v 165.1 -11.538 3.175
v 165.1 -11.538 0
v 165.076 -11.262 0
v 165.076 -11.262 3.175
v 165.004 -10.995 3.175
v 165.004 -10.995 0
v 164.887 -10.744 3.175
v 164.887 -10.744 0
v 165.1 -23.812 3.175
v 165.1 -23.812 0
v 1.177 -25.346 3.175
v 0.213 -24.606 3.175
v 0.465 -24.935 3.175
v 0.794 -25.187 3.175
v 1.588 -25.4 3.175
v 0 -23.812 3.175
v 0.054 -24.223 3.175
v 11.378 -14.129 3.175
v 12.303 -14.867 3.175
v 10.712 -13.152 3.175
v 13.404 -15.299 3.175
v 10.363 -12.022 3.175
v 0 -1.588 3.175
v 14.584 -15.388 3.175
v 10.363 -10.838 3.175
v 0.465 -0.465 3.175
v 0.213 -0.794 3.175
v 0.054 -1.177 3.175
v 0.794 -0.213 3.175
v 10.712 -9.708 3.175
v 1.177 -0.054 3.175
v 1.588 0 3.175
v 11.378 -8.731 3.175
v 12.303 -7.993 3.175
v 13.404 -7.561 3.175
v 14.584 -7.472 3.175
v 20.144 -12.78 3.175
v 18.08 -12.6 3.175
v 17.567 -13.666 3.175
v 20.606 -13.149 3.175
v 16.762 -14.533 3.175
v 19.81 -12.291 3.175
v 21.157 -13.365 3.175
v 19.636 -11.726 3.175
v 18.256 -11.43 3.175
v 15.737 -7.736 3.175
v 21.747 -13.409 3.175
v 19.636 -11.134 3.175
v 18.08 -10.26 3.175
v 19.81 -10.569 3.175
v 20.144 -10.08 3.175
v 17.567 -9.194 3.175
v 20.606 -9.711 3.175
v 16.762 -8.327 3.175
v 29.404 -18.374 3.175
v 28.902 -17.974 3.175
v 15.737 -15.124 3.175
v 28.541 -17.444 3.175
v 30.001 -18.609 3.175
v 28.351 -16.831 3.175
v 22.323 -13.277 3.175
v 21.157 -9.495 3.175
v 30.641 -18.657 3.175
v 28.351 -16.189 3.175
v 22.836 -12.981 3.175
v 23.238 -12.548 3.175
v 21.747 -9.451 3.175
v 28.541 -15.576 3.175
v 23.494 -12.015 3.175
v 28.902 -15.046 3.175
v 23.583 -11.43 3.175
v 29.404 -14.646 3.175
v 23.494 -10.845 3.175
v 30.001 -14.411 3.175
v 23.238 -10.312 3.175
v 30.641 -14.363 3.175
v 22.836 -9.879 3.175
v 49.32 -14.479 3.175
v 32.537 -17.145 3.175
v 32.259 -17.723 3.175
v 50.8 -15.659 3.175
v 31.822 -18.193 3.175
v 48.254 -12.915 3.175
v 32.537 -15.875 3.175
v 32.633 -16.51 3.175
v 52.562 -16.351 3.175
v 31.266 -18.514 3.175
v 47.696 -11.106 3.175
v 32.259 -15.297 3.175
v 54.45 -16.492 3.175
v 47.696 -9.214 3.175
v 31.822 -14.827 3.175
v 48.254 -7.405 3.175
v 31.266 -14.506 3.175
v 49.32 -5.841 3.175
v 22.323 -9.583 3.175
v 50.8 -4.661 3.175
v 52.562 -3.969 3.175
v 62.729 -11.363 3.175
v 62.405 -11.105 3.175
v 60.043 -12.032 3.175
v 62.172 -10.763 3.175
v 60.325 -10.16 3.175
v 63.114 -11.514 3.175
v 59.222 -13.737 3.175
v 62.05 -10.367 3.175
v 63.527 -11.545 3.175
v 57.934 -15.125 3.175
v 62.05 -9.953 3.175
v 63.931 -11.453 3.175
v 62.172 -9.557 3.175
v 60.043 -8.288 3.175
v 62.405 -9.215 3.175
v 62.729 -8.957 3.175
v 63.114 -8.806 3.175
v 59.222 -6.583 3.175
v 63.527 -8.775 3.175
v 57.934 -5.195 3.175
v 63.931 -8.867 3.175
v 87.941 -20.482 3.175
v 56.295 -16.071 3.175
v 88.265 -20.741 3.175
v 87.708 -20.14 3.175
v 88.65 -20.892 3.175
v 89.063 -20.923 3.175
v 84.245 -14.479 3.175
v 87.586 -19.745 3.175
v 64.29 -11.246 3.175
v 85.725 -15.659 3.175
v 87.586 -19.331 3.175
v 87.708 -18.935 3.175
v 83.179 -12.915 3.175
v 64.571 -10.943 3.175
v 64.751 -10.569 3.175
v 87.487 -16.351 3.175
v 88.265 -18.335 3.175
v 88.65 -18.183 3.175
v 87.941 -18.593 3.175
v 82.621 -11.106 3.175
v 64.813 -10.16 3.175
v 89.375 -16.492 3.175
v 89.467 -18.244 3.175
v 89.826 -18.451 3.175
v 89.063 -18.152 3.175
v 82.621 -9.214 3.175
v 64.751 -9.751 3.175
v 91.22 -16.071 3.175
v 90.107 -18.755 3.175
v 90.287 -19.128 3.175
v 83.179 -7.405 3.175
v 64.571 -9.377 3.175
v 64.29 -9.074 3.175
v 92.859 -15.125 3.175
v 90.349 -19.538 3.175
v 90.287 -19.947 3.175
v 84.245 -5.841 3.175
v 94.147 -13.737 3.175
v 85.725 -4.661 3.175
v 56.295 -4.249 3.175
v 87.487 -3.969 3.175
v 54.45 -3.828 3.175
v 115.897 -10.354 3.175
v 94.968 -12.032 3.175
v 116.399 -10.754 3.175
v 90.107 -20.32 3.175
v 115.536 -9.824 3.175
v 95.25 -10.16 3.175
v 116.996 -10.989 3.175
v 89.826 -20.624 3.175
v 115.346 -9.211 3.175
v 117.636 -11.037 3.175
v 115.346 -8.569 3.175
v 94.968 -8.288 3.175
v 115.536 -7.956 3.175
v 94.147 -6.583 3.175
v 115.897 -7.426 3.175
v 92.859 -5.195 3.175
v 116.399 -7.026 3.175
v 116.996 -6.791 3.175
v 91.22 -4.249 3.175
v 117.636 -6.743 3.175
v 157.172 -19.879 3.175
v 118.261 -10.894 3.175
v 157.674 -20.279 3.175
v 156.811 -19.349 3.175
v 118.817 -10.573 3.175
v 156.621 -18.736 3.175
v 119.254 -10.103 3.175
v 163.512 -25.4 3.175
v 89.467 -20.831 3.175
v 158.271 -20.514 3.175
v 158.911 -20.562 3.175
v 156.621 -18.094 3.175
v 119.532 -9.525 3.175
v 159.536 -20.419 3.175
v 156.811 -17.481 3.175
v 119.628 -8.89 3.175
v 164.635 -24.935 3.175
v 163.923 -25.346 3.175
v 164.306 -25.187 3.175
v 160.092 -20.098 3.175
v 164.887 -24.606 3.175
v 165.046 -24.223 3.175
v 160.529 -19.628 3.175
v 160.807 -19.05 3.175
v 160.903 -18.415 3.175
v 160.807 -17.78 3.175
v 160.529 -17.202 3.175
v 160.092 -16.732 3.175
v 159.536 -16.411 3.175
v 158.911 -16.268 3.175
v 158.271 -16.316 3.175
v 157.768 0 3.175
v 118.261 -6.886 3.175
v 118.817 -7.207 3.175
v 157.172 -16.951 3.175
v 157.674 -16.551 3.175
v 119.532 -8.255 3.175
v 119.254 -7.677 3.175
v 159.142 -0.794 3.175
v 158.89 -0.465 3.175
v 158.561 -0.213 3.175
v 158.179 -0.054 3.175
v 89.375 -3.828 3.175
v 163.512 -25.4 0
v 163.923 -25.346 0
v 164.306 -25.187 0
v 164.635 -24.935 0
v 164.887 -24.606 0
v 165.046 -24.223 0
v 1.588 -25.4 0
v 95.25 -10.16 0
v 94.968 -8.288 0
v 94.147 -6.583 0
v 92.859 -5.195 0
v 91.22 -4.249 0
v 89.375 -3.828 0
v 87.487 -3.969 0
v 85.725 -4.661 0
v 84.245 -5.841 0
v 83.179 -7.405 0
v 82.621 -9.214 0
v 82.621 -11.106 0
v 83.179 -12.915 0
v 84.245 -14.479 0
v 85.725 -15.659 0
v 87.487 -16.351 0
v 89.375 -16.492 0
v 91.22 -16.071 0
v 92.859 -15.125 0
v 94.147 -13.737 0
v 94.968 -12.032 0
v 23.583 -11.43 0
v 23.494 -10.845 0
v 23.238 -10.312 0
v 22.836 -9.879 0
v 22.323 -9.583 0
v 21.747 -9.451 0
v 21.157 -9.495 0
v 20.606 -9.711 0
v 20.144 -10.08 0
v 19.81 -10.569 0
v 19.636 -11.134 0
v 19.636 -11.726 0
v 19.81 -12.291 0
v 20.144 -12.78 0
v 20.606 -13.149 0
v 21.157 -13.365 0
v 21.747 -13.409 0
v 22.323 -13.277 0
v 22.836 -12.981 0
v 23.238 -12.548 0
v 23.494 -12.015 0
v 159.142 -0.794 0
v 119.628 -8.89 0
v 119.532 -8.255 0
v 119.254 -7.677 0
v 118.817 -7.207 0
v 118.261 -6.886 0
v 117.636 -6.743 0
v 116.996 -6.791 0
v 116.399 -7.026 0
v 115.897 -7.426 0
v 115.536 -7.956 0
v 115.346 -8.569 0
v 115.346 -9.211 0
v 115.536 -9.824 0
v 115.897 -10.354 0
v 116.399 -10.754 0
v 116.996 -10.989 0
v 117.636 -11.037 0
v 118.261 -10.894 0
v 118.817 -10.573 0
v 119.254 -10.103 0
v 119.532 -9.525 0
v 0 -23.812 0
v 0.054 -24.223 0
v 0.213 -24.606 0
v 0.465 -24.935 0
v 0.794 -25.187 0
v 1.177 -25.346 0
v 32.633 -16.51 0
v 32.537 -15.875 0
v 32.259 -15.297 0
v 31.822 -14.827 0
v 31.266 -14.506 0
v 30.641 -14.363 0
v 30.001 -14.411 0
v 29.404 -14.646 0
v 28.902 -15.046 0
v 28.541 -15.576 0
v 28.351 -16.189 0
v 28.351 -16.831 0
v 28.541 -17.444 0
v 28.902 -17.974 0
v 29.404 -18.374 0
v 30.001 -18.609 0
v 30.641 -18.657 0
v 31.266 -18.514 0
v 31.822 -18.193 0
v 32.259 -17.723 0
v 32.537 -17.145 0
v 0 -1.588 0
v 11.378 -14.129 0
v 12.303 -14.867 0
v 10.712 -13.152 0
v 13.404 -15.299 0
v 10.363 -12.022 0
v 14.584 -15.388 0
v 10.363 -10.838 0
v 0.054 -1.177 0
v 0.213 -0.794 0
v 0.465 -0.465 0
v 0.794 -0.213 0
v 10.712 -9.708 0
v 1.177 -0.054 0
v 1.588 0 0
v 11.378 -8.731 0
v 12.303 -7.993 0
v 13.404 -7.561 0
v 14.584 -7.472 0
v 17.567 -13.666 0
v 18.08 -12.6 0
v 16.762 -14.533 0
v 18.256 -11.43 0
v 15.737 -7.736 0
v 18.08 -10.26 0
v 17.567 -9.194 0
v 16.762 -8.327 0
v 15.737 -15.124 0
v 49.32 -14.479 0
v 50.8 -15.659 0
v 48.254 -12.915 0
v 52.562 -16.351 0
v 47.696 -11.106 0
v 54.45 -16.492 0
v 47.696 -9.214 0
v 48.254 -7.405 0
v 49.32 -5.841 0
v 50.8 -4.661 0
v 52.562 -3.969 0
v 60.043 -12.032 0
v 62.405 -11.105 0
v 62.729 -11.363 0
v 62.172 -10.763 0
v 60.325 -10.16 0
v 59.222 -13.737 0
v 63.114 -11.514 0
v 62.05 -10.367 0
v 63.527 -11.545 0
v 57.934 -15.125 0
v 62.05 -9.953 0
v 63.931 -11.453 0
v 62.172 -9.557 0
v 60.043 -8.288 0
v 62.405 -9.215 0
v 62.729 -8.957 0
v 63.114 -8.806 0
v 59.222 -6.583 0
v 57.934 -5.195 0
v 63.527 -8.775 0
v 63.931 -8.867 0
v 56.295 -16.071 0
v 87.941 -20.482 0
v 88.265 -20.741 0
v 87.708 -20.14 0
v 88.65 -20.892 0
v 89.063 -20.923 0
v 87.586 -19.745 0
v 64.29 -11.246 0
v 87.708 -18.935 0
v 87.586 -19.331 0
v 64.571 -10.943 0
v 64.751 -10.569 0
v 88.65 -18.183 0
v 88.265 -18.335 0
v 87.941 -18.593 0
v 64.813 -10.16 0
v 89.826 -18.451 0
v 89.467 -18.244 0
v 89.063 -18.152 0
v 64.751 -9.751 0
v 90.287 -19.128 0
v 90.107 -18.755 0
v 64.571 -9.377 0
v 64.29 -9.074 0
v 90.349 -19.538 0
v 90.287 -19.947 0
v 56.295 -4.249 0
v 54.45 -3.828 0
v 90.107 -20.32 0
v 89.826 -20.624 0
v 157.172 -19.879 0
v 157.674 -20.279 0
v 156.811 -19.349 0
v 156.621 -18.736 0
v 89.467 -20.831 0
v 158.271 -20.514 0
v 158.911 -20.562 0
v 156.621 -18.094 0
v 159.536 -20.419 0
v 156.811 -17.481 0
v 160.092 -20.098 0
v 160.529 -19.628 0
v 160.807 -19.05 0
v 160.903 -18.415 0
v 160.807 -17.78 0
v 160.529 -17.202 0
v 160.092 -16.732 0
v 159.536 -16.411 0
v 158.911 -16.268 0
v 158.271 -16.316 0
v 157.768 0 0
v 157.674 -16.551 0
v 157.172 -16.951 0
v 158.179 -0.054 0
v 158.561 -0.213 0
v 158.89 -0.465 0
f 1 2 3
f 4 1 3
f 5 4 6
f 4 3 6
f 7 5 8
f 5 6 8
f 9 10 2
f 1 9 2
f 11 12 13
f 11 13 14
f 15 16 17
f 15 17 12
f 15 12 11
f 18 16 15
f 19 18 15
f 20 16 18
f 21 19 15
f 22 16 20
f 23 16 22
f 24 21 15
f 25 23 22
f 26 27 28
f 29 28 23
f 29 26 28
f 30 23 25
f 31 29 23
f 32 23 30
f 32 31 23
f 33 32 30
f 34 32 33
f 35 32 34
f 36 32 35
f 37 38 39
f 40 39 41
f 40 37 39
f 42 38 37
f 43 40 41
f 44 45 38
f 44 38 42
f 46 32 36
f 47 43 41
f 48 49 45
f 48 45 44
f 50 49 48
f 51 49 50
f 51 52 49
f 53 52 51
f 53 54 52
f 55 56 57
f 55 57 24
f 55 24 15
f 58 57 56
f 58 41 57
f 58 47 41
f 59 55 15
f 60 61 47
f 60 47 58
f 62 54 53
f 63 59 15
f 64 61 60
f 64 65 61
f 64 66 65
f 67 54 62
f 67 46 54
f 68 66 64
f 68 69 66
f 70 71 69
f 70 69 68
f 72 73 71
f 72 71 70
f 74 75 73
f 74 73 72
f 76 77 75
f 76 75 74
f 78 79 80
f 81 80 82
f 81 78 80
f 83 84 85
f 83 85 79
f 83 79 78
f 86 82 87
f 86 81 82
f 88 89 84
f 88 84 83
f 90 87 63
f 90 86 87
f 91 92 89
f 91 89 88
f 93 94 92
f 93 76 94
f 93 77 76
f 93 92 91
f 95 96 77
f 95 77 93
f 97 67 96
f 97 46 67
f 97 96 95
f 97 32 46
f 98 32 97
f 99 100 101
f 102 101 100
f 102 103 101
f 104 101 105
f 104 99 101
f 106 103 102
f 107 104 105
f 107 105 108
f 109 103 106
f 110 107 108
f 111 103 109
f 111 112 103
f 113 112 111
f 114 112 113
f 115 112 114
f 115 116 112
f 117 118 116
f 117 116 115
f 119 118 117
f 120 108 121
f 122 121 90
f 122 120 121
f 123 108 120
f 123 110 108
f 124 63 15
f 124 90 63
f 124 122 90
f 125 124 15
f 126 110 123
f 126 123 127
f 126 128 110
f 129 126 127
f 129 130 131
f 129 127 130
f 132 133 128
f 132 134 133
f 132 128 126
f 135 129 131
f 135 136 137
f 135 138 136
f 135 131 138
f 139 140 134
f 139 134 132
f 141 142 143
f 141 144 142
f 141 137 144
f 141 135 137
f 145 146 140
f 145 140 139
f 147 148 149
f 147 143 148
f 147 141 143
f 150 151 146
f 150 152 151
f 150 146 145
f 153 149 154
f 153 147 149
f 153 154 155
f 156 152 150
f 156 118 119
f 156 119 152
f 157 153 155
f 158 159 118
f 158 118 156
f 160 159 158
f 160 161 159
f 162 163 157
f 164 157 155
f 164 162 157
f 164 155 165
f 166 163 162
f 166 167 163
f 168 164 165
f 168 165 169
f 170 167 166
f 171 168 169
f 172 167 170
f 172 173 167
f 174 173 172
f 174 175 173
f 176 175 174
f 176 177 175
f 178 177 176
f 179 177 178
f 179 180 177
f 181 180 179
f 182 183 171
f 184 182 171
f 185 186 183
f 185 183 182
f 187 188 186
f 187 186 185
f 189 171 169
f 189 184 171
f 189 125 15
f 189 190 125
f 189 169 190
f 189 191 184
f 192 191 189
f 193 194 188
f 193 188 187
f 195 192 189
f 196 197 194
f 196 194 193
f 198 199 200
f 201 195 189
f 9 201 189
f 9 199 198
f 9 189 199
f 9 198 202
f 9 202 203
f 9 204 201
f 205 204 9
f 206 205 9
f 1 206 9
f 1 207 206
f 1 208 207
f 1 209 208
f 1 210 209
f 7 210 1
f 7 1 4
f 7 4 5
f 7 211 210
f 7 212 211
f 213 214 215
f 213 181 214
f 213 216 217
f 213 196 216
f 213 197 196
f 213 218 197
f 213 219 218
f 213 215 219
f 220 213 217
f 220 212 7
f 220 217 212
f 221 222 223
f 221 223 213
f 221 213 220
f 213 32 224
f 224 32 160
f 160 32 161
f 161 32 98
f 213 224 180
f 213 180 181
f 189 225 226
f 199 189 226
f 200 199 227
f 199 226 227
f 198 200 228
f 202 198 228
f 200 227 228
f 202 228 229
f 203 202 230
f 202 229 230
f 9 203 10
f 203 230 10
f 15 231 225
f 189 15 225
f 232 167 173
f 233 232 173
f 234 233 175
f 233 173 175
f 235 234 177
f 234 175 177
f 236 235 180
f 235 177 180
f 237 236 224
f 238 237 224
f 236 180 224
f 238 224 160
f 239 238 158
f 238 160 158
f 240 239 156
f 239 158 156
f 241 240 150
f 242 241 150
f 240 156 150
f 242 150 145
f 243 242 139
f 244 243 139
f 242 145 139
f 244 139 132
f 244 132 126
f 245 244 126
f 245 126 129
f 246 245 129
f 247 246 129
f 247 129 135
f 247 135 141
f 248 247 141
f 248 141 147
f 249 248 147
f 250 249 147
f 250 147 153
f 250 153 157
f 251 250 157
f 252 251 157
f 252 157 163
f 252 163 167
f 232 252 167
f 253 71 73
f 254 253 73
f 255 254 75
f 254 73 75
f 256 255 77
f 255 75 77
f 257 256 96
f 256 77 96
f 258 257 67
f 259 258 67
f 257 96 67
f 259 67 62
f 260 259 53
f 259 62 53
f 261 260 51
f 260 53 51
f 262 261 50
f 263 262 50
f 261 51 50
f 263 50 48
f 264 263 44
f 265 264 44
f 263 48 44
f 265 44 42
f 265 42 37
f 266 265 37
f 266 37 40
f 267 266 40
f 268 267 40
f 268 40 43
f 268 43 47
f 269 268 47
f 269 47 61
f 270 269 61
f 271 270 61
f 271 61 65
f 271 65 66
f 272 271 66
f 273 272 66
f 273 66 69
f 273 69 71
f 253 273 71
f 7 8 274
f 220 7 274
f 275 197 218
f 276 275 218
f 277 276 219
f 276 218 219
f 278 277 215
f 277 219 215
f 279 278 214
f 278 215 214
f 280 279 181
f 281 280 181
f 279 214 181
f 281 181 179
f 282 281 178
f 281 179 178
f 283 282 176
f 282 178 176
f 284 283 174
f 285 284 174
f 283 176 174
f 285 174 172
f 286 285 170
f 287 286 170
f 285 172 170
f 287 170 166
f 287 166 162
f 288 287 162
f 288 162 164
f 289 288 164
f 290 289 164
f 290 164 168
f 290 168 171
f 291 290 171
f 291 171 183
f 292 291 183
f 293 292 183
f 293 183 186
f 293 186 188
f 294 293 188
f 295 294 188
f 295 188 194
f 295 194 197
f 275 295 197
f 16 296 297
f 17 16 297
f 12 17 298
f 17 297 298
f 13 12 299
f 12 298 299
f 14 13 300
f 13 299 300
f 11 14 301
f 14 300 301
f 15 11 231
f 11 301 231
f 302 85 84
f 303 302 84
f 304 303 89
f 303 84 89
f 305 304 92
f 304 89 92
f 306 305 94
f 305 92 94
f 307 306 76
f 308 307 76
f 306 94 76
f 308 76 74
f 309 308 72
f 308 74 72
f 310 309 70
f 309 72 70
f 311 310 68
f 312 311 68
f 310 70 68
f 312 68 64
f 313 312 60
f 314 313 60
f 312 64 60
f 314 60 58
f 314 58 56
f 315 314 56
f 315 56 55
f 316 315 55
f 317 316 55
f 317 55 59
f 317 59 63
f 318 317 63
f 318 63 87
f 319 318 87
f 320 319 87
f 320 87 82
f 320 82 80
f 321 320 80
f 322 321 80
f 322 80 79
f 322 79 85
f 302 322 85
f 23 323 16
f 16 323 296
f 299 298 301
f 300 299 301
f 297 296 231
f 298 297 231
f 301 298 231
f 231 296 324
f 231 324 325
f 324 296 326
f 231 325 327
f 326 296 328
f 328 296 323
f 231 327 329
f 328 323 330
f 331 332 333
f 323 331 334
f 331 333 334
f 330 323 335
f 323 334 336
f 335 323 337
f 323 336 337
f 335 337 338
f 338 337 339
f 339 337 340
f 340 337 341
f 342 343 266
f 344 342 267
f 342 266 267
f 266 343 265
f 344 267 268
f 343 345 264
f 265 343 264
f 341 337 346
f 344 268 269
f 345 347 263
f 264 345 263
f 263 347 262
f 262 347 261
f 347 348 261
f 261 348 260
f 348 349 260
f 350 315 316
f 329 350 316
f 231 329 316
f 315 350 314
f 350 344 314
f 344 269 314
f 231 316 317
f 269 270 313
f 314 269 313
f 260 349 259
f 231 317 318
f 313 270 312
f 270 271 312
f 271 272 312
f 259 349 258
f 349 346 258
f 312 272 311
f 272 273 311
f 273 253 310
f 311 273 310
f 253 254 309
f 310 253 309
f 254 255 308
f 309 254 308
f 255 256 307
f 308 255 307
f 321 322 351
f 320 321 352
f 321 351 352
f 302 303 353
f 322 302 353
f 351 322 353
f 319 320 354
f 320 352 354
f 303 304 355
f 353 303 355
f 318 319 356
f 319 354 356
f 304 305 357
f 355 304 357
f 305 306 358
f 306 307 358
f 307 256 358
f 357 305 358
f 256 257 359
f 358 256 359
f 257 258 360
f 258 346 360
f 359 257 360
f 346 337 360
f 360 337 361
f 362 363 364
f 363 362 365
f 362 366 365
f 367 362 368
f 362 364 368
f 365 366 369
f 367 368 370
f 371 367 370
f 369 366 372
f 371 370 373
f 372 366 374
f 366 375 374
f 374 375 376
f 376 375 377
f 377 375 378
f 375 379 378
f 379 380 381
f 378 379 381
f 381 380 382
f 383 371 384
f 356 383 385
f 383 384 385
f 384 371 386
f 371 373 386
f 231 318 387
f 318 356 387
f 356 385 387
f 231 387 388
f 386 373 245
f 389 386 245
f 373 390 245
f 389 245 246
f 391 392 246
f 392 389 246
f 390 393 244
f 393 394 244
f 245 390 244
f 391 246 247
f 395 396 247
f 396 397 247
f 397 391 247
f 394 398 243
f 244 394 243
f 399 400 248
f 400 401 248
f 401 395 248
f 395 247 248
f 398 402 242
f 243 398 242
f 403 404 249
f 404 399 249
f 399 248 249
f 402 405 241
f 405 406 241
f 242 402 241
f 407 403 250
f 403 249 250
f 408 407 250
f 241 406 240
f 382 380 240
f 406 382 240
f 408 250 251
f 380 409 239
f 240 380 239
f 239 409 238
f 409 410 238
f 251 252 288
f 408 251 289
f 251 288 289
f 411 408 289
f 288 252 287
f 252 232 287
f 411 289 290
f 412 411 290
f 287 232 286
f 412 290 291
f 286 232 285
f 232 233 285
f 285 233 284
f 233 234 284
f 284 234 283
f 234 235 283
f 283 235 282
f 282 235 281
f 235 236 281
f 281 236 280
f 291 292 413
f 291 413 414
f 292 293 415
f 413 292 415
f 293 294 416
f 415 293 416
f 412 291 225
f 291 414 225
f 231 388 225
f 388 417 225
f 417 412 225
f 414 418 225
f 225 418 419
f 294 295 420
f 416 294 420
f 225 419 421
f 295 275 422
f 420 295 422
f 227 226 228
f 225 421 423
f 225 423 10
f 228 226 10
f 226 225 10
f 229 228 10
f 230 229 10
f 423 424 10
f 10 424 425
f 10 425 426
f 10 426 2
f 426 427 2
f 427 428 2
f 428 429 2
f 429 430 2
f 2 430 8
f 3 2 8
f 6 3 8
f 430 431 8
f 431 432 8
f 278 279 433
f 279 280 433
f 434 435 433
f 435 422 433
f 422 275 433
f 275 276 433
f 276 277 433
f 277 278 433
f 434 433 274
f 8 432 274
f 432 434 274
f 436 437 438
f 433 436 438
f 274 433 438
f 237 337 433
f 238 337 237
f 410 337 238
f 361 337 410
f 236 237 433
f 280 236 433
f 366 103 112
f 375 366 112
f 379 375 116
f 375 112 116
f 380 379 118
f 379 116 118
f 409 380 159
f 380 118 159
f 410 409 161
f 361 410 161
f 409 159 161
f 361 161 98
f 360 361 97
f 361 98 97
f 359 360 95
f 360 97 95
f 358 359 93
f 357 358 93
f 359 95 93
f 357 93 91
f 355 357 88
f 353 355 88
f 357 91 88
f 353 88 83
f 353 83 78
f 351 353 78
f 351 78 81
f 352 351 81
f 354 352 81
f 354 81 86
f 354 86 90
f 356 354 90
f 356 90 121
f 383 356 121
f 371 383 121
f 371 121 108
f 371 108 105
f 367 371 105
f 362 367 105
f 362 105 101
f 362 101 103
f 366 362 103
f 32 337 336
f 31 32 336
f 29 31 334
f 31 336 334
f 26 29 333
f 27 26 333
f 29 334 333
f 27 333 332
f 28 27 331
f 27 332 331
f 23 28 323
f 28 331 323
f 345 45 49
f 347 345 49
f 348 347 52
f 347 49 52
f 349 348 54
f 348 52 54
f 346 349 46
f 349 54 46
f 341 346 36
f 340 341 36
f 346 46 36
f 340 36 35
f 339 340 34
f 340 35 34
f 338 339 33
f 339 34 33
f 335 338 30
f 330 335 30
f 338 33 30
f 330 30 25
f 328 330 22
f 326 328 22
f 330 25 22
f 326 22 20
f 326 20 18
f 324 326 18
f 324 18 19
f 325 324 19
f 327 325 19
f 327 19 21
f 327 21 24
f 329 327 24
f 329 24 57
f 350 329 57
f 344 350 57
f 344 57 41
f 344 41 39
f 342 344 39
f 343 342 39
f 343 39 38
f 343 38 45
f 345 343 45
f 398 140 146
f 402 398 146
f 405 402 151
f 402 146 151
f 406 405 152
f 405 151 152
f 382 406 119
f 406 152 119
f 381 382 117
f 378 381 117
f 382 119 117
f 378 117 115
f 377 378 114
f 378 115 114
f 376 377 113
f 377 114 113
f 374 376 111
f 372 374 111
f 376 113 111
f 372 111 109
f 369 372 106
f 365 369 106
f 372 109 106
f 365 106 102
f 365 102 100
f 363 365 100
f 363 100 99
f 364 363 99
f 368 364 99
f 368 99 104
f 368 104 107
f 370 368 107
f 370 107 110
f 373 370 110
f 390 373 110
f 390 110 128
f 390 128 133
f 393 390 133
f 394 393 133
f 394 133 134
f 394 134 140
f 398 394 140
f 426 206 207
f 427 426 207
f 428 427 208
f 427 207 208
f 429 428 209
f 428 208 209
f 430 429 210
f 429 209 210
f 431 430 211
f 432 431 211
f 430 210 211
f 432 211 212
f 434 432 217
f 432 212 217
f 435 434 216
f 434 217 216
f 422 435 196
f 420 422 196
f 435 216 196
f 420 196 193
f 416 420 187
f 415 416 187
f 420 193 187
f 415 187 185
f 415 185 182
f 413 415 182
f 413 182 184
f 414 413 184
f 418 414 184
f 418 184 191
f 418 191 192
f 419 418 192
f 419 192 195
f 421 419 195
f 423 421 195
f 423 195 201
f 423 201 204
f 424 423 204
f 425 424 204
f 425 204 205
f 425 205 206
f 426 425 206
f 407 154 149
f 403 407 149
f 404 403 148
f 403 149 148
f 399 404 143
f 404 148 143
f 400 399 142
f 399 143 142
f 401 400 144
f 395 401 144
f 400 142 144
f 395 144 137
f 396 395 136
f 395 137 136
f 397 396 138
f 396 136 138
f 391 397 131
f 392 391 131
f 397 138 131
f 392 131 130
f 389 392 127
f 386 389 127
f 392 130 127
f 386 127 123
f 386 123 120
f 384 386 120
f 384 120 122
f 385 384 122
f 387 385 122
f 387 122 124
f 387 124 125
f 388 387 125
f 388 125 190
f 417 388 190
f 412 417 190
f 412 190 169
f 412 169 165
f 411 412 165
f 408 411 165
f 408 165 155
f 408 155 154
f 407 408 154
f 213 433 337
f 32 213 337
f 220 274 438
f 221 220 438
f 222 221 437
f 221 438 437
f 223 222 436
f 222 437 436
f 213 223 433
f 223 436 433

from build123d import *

# Parameters (mm, degrees)
BOSS_EXTRUDE1_DEPTH             = 3.175
F_1_2_0_5_DIAMETER_HOLE1_D      = 12.7
F_5_16_0_3125_DIAMETER_HOLE1_D  = 7.9375
F_5_32_0_15625_DIAMETER_HOLE1_D = 3.96875
F_7_64_0_10938_DIAMETER_HOLE1_D = 2.778252
F_6_CLEARANCE_HOLE1_D           = 4.3053


with BuildPart() as part:
    # Sketch1 → Boss-Extrude1 (new body)
    with BuildSketch(Plane.XY):
        with BuildLine():
            Line((157.767651581, 0), (1.5875, 0))
            ThreePointArc((1.5875, 0), (0.464967985, -0.464967985), (0, -1.5875))
            Line((0, -1.5875), (0, -23.8125))
            ThreePointArc((0, -23.8125), (0.464967985, -24.935032015), (1.5875, -25.4))
            Line((1.5875, -25.4), (163.5125, -25.4))
            ThreePointArc((163.5125, -25.4), (164.635032015, -24.935032015), (165.1, -23.8125))
            Line((165.1, -23.8125), (165.1, -11.537869343))
            ThreePointArc((165.1, -11.537869343), (165.045907249, -11.126994109), (164.887315329, -10.744119343))
            Line((164.887315329, -10.744119343), (159.14246691, -0.79375))
            ThreePointArc((159.14246691, -0.79375), (158.561401581, -0.212684671), (157.767651581, 0))
        make_face()
    extrude(amount=BOSS_EXTRUDE1_DEPTH)

    # 1/2 (0.5) Diameter Hole1 (through all)
    with Locations(Plane(origin=(0, 0, 0), x_dir=(-1, 0, 0), z_dir=(0, 0, -1))):
        with Locations((-53.975, -10.16), (-88.9, -10.16)):
            Hole(F_1_2_0_5_DIAMETER_HOLE1_D / 2)

    # 5/16 (0.3125) Diameter Hole1 (through all)
    with Locations(Plane(origin=(0, 0, 0), x_dir=(-1, 0, 0), z_dir=(0, 0, -1))):
        with Locations((-14.2875, -11.43)):
            Hole(F_5_16_0_3125_DIAMETER_HOLE1_D / 2)

    # 5/32 (0.15625) Diameter Hole1 (through all)
    with Locations(Plane(origin=(0, 0, 0), x_dir=(-1, 0, 0), z_dir=(0, 0, -1))):
        with Locations((-21.598282462, -11.43)):
            Hole(F_5_32_0_15625_DIAMETER_HOLE1_D / 2)

    # 7/64 (0.10938) Diameter Hole1 (through all)
    with Locations(Plane(origin=(0, 0, 0), x_dir=(-1, 0, 0), z_dir=(0, 0, -1))):
        with Locations((-88.959471598, -19.537541197), (-63.423407807, -10.16)):
            Hole(F_7_64_0_10938_DIAMETER_HOLE1_D / 2)

    # #6 Clearance Hole1 (through all)
    with Locations(Plane(origin=(0, 0, 0), x_dir=(-1, 0, 0), z_dir=(0, 0, -1))):
        with Locations((-158.75, -18.415), (-117.475, -8.89), (-30.48, -16.51)):
            Hole(F_6_CLEARANCE_HOLE1_D / 2)


solid = part.part
